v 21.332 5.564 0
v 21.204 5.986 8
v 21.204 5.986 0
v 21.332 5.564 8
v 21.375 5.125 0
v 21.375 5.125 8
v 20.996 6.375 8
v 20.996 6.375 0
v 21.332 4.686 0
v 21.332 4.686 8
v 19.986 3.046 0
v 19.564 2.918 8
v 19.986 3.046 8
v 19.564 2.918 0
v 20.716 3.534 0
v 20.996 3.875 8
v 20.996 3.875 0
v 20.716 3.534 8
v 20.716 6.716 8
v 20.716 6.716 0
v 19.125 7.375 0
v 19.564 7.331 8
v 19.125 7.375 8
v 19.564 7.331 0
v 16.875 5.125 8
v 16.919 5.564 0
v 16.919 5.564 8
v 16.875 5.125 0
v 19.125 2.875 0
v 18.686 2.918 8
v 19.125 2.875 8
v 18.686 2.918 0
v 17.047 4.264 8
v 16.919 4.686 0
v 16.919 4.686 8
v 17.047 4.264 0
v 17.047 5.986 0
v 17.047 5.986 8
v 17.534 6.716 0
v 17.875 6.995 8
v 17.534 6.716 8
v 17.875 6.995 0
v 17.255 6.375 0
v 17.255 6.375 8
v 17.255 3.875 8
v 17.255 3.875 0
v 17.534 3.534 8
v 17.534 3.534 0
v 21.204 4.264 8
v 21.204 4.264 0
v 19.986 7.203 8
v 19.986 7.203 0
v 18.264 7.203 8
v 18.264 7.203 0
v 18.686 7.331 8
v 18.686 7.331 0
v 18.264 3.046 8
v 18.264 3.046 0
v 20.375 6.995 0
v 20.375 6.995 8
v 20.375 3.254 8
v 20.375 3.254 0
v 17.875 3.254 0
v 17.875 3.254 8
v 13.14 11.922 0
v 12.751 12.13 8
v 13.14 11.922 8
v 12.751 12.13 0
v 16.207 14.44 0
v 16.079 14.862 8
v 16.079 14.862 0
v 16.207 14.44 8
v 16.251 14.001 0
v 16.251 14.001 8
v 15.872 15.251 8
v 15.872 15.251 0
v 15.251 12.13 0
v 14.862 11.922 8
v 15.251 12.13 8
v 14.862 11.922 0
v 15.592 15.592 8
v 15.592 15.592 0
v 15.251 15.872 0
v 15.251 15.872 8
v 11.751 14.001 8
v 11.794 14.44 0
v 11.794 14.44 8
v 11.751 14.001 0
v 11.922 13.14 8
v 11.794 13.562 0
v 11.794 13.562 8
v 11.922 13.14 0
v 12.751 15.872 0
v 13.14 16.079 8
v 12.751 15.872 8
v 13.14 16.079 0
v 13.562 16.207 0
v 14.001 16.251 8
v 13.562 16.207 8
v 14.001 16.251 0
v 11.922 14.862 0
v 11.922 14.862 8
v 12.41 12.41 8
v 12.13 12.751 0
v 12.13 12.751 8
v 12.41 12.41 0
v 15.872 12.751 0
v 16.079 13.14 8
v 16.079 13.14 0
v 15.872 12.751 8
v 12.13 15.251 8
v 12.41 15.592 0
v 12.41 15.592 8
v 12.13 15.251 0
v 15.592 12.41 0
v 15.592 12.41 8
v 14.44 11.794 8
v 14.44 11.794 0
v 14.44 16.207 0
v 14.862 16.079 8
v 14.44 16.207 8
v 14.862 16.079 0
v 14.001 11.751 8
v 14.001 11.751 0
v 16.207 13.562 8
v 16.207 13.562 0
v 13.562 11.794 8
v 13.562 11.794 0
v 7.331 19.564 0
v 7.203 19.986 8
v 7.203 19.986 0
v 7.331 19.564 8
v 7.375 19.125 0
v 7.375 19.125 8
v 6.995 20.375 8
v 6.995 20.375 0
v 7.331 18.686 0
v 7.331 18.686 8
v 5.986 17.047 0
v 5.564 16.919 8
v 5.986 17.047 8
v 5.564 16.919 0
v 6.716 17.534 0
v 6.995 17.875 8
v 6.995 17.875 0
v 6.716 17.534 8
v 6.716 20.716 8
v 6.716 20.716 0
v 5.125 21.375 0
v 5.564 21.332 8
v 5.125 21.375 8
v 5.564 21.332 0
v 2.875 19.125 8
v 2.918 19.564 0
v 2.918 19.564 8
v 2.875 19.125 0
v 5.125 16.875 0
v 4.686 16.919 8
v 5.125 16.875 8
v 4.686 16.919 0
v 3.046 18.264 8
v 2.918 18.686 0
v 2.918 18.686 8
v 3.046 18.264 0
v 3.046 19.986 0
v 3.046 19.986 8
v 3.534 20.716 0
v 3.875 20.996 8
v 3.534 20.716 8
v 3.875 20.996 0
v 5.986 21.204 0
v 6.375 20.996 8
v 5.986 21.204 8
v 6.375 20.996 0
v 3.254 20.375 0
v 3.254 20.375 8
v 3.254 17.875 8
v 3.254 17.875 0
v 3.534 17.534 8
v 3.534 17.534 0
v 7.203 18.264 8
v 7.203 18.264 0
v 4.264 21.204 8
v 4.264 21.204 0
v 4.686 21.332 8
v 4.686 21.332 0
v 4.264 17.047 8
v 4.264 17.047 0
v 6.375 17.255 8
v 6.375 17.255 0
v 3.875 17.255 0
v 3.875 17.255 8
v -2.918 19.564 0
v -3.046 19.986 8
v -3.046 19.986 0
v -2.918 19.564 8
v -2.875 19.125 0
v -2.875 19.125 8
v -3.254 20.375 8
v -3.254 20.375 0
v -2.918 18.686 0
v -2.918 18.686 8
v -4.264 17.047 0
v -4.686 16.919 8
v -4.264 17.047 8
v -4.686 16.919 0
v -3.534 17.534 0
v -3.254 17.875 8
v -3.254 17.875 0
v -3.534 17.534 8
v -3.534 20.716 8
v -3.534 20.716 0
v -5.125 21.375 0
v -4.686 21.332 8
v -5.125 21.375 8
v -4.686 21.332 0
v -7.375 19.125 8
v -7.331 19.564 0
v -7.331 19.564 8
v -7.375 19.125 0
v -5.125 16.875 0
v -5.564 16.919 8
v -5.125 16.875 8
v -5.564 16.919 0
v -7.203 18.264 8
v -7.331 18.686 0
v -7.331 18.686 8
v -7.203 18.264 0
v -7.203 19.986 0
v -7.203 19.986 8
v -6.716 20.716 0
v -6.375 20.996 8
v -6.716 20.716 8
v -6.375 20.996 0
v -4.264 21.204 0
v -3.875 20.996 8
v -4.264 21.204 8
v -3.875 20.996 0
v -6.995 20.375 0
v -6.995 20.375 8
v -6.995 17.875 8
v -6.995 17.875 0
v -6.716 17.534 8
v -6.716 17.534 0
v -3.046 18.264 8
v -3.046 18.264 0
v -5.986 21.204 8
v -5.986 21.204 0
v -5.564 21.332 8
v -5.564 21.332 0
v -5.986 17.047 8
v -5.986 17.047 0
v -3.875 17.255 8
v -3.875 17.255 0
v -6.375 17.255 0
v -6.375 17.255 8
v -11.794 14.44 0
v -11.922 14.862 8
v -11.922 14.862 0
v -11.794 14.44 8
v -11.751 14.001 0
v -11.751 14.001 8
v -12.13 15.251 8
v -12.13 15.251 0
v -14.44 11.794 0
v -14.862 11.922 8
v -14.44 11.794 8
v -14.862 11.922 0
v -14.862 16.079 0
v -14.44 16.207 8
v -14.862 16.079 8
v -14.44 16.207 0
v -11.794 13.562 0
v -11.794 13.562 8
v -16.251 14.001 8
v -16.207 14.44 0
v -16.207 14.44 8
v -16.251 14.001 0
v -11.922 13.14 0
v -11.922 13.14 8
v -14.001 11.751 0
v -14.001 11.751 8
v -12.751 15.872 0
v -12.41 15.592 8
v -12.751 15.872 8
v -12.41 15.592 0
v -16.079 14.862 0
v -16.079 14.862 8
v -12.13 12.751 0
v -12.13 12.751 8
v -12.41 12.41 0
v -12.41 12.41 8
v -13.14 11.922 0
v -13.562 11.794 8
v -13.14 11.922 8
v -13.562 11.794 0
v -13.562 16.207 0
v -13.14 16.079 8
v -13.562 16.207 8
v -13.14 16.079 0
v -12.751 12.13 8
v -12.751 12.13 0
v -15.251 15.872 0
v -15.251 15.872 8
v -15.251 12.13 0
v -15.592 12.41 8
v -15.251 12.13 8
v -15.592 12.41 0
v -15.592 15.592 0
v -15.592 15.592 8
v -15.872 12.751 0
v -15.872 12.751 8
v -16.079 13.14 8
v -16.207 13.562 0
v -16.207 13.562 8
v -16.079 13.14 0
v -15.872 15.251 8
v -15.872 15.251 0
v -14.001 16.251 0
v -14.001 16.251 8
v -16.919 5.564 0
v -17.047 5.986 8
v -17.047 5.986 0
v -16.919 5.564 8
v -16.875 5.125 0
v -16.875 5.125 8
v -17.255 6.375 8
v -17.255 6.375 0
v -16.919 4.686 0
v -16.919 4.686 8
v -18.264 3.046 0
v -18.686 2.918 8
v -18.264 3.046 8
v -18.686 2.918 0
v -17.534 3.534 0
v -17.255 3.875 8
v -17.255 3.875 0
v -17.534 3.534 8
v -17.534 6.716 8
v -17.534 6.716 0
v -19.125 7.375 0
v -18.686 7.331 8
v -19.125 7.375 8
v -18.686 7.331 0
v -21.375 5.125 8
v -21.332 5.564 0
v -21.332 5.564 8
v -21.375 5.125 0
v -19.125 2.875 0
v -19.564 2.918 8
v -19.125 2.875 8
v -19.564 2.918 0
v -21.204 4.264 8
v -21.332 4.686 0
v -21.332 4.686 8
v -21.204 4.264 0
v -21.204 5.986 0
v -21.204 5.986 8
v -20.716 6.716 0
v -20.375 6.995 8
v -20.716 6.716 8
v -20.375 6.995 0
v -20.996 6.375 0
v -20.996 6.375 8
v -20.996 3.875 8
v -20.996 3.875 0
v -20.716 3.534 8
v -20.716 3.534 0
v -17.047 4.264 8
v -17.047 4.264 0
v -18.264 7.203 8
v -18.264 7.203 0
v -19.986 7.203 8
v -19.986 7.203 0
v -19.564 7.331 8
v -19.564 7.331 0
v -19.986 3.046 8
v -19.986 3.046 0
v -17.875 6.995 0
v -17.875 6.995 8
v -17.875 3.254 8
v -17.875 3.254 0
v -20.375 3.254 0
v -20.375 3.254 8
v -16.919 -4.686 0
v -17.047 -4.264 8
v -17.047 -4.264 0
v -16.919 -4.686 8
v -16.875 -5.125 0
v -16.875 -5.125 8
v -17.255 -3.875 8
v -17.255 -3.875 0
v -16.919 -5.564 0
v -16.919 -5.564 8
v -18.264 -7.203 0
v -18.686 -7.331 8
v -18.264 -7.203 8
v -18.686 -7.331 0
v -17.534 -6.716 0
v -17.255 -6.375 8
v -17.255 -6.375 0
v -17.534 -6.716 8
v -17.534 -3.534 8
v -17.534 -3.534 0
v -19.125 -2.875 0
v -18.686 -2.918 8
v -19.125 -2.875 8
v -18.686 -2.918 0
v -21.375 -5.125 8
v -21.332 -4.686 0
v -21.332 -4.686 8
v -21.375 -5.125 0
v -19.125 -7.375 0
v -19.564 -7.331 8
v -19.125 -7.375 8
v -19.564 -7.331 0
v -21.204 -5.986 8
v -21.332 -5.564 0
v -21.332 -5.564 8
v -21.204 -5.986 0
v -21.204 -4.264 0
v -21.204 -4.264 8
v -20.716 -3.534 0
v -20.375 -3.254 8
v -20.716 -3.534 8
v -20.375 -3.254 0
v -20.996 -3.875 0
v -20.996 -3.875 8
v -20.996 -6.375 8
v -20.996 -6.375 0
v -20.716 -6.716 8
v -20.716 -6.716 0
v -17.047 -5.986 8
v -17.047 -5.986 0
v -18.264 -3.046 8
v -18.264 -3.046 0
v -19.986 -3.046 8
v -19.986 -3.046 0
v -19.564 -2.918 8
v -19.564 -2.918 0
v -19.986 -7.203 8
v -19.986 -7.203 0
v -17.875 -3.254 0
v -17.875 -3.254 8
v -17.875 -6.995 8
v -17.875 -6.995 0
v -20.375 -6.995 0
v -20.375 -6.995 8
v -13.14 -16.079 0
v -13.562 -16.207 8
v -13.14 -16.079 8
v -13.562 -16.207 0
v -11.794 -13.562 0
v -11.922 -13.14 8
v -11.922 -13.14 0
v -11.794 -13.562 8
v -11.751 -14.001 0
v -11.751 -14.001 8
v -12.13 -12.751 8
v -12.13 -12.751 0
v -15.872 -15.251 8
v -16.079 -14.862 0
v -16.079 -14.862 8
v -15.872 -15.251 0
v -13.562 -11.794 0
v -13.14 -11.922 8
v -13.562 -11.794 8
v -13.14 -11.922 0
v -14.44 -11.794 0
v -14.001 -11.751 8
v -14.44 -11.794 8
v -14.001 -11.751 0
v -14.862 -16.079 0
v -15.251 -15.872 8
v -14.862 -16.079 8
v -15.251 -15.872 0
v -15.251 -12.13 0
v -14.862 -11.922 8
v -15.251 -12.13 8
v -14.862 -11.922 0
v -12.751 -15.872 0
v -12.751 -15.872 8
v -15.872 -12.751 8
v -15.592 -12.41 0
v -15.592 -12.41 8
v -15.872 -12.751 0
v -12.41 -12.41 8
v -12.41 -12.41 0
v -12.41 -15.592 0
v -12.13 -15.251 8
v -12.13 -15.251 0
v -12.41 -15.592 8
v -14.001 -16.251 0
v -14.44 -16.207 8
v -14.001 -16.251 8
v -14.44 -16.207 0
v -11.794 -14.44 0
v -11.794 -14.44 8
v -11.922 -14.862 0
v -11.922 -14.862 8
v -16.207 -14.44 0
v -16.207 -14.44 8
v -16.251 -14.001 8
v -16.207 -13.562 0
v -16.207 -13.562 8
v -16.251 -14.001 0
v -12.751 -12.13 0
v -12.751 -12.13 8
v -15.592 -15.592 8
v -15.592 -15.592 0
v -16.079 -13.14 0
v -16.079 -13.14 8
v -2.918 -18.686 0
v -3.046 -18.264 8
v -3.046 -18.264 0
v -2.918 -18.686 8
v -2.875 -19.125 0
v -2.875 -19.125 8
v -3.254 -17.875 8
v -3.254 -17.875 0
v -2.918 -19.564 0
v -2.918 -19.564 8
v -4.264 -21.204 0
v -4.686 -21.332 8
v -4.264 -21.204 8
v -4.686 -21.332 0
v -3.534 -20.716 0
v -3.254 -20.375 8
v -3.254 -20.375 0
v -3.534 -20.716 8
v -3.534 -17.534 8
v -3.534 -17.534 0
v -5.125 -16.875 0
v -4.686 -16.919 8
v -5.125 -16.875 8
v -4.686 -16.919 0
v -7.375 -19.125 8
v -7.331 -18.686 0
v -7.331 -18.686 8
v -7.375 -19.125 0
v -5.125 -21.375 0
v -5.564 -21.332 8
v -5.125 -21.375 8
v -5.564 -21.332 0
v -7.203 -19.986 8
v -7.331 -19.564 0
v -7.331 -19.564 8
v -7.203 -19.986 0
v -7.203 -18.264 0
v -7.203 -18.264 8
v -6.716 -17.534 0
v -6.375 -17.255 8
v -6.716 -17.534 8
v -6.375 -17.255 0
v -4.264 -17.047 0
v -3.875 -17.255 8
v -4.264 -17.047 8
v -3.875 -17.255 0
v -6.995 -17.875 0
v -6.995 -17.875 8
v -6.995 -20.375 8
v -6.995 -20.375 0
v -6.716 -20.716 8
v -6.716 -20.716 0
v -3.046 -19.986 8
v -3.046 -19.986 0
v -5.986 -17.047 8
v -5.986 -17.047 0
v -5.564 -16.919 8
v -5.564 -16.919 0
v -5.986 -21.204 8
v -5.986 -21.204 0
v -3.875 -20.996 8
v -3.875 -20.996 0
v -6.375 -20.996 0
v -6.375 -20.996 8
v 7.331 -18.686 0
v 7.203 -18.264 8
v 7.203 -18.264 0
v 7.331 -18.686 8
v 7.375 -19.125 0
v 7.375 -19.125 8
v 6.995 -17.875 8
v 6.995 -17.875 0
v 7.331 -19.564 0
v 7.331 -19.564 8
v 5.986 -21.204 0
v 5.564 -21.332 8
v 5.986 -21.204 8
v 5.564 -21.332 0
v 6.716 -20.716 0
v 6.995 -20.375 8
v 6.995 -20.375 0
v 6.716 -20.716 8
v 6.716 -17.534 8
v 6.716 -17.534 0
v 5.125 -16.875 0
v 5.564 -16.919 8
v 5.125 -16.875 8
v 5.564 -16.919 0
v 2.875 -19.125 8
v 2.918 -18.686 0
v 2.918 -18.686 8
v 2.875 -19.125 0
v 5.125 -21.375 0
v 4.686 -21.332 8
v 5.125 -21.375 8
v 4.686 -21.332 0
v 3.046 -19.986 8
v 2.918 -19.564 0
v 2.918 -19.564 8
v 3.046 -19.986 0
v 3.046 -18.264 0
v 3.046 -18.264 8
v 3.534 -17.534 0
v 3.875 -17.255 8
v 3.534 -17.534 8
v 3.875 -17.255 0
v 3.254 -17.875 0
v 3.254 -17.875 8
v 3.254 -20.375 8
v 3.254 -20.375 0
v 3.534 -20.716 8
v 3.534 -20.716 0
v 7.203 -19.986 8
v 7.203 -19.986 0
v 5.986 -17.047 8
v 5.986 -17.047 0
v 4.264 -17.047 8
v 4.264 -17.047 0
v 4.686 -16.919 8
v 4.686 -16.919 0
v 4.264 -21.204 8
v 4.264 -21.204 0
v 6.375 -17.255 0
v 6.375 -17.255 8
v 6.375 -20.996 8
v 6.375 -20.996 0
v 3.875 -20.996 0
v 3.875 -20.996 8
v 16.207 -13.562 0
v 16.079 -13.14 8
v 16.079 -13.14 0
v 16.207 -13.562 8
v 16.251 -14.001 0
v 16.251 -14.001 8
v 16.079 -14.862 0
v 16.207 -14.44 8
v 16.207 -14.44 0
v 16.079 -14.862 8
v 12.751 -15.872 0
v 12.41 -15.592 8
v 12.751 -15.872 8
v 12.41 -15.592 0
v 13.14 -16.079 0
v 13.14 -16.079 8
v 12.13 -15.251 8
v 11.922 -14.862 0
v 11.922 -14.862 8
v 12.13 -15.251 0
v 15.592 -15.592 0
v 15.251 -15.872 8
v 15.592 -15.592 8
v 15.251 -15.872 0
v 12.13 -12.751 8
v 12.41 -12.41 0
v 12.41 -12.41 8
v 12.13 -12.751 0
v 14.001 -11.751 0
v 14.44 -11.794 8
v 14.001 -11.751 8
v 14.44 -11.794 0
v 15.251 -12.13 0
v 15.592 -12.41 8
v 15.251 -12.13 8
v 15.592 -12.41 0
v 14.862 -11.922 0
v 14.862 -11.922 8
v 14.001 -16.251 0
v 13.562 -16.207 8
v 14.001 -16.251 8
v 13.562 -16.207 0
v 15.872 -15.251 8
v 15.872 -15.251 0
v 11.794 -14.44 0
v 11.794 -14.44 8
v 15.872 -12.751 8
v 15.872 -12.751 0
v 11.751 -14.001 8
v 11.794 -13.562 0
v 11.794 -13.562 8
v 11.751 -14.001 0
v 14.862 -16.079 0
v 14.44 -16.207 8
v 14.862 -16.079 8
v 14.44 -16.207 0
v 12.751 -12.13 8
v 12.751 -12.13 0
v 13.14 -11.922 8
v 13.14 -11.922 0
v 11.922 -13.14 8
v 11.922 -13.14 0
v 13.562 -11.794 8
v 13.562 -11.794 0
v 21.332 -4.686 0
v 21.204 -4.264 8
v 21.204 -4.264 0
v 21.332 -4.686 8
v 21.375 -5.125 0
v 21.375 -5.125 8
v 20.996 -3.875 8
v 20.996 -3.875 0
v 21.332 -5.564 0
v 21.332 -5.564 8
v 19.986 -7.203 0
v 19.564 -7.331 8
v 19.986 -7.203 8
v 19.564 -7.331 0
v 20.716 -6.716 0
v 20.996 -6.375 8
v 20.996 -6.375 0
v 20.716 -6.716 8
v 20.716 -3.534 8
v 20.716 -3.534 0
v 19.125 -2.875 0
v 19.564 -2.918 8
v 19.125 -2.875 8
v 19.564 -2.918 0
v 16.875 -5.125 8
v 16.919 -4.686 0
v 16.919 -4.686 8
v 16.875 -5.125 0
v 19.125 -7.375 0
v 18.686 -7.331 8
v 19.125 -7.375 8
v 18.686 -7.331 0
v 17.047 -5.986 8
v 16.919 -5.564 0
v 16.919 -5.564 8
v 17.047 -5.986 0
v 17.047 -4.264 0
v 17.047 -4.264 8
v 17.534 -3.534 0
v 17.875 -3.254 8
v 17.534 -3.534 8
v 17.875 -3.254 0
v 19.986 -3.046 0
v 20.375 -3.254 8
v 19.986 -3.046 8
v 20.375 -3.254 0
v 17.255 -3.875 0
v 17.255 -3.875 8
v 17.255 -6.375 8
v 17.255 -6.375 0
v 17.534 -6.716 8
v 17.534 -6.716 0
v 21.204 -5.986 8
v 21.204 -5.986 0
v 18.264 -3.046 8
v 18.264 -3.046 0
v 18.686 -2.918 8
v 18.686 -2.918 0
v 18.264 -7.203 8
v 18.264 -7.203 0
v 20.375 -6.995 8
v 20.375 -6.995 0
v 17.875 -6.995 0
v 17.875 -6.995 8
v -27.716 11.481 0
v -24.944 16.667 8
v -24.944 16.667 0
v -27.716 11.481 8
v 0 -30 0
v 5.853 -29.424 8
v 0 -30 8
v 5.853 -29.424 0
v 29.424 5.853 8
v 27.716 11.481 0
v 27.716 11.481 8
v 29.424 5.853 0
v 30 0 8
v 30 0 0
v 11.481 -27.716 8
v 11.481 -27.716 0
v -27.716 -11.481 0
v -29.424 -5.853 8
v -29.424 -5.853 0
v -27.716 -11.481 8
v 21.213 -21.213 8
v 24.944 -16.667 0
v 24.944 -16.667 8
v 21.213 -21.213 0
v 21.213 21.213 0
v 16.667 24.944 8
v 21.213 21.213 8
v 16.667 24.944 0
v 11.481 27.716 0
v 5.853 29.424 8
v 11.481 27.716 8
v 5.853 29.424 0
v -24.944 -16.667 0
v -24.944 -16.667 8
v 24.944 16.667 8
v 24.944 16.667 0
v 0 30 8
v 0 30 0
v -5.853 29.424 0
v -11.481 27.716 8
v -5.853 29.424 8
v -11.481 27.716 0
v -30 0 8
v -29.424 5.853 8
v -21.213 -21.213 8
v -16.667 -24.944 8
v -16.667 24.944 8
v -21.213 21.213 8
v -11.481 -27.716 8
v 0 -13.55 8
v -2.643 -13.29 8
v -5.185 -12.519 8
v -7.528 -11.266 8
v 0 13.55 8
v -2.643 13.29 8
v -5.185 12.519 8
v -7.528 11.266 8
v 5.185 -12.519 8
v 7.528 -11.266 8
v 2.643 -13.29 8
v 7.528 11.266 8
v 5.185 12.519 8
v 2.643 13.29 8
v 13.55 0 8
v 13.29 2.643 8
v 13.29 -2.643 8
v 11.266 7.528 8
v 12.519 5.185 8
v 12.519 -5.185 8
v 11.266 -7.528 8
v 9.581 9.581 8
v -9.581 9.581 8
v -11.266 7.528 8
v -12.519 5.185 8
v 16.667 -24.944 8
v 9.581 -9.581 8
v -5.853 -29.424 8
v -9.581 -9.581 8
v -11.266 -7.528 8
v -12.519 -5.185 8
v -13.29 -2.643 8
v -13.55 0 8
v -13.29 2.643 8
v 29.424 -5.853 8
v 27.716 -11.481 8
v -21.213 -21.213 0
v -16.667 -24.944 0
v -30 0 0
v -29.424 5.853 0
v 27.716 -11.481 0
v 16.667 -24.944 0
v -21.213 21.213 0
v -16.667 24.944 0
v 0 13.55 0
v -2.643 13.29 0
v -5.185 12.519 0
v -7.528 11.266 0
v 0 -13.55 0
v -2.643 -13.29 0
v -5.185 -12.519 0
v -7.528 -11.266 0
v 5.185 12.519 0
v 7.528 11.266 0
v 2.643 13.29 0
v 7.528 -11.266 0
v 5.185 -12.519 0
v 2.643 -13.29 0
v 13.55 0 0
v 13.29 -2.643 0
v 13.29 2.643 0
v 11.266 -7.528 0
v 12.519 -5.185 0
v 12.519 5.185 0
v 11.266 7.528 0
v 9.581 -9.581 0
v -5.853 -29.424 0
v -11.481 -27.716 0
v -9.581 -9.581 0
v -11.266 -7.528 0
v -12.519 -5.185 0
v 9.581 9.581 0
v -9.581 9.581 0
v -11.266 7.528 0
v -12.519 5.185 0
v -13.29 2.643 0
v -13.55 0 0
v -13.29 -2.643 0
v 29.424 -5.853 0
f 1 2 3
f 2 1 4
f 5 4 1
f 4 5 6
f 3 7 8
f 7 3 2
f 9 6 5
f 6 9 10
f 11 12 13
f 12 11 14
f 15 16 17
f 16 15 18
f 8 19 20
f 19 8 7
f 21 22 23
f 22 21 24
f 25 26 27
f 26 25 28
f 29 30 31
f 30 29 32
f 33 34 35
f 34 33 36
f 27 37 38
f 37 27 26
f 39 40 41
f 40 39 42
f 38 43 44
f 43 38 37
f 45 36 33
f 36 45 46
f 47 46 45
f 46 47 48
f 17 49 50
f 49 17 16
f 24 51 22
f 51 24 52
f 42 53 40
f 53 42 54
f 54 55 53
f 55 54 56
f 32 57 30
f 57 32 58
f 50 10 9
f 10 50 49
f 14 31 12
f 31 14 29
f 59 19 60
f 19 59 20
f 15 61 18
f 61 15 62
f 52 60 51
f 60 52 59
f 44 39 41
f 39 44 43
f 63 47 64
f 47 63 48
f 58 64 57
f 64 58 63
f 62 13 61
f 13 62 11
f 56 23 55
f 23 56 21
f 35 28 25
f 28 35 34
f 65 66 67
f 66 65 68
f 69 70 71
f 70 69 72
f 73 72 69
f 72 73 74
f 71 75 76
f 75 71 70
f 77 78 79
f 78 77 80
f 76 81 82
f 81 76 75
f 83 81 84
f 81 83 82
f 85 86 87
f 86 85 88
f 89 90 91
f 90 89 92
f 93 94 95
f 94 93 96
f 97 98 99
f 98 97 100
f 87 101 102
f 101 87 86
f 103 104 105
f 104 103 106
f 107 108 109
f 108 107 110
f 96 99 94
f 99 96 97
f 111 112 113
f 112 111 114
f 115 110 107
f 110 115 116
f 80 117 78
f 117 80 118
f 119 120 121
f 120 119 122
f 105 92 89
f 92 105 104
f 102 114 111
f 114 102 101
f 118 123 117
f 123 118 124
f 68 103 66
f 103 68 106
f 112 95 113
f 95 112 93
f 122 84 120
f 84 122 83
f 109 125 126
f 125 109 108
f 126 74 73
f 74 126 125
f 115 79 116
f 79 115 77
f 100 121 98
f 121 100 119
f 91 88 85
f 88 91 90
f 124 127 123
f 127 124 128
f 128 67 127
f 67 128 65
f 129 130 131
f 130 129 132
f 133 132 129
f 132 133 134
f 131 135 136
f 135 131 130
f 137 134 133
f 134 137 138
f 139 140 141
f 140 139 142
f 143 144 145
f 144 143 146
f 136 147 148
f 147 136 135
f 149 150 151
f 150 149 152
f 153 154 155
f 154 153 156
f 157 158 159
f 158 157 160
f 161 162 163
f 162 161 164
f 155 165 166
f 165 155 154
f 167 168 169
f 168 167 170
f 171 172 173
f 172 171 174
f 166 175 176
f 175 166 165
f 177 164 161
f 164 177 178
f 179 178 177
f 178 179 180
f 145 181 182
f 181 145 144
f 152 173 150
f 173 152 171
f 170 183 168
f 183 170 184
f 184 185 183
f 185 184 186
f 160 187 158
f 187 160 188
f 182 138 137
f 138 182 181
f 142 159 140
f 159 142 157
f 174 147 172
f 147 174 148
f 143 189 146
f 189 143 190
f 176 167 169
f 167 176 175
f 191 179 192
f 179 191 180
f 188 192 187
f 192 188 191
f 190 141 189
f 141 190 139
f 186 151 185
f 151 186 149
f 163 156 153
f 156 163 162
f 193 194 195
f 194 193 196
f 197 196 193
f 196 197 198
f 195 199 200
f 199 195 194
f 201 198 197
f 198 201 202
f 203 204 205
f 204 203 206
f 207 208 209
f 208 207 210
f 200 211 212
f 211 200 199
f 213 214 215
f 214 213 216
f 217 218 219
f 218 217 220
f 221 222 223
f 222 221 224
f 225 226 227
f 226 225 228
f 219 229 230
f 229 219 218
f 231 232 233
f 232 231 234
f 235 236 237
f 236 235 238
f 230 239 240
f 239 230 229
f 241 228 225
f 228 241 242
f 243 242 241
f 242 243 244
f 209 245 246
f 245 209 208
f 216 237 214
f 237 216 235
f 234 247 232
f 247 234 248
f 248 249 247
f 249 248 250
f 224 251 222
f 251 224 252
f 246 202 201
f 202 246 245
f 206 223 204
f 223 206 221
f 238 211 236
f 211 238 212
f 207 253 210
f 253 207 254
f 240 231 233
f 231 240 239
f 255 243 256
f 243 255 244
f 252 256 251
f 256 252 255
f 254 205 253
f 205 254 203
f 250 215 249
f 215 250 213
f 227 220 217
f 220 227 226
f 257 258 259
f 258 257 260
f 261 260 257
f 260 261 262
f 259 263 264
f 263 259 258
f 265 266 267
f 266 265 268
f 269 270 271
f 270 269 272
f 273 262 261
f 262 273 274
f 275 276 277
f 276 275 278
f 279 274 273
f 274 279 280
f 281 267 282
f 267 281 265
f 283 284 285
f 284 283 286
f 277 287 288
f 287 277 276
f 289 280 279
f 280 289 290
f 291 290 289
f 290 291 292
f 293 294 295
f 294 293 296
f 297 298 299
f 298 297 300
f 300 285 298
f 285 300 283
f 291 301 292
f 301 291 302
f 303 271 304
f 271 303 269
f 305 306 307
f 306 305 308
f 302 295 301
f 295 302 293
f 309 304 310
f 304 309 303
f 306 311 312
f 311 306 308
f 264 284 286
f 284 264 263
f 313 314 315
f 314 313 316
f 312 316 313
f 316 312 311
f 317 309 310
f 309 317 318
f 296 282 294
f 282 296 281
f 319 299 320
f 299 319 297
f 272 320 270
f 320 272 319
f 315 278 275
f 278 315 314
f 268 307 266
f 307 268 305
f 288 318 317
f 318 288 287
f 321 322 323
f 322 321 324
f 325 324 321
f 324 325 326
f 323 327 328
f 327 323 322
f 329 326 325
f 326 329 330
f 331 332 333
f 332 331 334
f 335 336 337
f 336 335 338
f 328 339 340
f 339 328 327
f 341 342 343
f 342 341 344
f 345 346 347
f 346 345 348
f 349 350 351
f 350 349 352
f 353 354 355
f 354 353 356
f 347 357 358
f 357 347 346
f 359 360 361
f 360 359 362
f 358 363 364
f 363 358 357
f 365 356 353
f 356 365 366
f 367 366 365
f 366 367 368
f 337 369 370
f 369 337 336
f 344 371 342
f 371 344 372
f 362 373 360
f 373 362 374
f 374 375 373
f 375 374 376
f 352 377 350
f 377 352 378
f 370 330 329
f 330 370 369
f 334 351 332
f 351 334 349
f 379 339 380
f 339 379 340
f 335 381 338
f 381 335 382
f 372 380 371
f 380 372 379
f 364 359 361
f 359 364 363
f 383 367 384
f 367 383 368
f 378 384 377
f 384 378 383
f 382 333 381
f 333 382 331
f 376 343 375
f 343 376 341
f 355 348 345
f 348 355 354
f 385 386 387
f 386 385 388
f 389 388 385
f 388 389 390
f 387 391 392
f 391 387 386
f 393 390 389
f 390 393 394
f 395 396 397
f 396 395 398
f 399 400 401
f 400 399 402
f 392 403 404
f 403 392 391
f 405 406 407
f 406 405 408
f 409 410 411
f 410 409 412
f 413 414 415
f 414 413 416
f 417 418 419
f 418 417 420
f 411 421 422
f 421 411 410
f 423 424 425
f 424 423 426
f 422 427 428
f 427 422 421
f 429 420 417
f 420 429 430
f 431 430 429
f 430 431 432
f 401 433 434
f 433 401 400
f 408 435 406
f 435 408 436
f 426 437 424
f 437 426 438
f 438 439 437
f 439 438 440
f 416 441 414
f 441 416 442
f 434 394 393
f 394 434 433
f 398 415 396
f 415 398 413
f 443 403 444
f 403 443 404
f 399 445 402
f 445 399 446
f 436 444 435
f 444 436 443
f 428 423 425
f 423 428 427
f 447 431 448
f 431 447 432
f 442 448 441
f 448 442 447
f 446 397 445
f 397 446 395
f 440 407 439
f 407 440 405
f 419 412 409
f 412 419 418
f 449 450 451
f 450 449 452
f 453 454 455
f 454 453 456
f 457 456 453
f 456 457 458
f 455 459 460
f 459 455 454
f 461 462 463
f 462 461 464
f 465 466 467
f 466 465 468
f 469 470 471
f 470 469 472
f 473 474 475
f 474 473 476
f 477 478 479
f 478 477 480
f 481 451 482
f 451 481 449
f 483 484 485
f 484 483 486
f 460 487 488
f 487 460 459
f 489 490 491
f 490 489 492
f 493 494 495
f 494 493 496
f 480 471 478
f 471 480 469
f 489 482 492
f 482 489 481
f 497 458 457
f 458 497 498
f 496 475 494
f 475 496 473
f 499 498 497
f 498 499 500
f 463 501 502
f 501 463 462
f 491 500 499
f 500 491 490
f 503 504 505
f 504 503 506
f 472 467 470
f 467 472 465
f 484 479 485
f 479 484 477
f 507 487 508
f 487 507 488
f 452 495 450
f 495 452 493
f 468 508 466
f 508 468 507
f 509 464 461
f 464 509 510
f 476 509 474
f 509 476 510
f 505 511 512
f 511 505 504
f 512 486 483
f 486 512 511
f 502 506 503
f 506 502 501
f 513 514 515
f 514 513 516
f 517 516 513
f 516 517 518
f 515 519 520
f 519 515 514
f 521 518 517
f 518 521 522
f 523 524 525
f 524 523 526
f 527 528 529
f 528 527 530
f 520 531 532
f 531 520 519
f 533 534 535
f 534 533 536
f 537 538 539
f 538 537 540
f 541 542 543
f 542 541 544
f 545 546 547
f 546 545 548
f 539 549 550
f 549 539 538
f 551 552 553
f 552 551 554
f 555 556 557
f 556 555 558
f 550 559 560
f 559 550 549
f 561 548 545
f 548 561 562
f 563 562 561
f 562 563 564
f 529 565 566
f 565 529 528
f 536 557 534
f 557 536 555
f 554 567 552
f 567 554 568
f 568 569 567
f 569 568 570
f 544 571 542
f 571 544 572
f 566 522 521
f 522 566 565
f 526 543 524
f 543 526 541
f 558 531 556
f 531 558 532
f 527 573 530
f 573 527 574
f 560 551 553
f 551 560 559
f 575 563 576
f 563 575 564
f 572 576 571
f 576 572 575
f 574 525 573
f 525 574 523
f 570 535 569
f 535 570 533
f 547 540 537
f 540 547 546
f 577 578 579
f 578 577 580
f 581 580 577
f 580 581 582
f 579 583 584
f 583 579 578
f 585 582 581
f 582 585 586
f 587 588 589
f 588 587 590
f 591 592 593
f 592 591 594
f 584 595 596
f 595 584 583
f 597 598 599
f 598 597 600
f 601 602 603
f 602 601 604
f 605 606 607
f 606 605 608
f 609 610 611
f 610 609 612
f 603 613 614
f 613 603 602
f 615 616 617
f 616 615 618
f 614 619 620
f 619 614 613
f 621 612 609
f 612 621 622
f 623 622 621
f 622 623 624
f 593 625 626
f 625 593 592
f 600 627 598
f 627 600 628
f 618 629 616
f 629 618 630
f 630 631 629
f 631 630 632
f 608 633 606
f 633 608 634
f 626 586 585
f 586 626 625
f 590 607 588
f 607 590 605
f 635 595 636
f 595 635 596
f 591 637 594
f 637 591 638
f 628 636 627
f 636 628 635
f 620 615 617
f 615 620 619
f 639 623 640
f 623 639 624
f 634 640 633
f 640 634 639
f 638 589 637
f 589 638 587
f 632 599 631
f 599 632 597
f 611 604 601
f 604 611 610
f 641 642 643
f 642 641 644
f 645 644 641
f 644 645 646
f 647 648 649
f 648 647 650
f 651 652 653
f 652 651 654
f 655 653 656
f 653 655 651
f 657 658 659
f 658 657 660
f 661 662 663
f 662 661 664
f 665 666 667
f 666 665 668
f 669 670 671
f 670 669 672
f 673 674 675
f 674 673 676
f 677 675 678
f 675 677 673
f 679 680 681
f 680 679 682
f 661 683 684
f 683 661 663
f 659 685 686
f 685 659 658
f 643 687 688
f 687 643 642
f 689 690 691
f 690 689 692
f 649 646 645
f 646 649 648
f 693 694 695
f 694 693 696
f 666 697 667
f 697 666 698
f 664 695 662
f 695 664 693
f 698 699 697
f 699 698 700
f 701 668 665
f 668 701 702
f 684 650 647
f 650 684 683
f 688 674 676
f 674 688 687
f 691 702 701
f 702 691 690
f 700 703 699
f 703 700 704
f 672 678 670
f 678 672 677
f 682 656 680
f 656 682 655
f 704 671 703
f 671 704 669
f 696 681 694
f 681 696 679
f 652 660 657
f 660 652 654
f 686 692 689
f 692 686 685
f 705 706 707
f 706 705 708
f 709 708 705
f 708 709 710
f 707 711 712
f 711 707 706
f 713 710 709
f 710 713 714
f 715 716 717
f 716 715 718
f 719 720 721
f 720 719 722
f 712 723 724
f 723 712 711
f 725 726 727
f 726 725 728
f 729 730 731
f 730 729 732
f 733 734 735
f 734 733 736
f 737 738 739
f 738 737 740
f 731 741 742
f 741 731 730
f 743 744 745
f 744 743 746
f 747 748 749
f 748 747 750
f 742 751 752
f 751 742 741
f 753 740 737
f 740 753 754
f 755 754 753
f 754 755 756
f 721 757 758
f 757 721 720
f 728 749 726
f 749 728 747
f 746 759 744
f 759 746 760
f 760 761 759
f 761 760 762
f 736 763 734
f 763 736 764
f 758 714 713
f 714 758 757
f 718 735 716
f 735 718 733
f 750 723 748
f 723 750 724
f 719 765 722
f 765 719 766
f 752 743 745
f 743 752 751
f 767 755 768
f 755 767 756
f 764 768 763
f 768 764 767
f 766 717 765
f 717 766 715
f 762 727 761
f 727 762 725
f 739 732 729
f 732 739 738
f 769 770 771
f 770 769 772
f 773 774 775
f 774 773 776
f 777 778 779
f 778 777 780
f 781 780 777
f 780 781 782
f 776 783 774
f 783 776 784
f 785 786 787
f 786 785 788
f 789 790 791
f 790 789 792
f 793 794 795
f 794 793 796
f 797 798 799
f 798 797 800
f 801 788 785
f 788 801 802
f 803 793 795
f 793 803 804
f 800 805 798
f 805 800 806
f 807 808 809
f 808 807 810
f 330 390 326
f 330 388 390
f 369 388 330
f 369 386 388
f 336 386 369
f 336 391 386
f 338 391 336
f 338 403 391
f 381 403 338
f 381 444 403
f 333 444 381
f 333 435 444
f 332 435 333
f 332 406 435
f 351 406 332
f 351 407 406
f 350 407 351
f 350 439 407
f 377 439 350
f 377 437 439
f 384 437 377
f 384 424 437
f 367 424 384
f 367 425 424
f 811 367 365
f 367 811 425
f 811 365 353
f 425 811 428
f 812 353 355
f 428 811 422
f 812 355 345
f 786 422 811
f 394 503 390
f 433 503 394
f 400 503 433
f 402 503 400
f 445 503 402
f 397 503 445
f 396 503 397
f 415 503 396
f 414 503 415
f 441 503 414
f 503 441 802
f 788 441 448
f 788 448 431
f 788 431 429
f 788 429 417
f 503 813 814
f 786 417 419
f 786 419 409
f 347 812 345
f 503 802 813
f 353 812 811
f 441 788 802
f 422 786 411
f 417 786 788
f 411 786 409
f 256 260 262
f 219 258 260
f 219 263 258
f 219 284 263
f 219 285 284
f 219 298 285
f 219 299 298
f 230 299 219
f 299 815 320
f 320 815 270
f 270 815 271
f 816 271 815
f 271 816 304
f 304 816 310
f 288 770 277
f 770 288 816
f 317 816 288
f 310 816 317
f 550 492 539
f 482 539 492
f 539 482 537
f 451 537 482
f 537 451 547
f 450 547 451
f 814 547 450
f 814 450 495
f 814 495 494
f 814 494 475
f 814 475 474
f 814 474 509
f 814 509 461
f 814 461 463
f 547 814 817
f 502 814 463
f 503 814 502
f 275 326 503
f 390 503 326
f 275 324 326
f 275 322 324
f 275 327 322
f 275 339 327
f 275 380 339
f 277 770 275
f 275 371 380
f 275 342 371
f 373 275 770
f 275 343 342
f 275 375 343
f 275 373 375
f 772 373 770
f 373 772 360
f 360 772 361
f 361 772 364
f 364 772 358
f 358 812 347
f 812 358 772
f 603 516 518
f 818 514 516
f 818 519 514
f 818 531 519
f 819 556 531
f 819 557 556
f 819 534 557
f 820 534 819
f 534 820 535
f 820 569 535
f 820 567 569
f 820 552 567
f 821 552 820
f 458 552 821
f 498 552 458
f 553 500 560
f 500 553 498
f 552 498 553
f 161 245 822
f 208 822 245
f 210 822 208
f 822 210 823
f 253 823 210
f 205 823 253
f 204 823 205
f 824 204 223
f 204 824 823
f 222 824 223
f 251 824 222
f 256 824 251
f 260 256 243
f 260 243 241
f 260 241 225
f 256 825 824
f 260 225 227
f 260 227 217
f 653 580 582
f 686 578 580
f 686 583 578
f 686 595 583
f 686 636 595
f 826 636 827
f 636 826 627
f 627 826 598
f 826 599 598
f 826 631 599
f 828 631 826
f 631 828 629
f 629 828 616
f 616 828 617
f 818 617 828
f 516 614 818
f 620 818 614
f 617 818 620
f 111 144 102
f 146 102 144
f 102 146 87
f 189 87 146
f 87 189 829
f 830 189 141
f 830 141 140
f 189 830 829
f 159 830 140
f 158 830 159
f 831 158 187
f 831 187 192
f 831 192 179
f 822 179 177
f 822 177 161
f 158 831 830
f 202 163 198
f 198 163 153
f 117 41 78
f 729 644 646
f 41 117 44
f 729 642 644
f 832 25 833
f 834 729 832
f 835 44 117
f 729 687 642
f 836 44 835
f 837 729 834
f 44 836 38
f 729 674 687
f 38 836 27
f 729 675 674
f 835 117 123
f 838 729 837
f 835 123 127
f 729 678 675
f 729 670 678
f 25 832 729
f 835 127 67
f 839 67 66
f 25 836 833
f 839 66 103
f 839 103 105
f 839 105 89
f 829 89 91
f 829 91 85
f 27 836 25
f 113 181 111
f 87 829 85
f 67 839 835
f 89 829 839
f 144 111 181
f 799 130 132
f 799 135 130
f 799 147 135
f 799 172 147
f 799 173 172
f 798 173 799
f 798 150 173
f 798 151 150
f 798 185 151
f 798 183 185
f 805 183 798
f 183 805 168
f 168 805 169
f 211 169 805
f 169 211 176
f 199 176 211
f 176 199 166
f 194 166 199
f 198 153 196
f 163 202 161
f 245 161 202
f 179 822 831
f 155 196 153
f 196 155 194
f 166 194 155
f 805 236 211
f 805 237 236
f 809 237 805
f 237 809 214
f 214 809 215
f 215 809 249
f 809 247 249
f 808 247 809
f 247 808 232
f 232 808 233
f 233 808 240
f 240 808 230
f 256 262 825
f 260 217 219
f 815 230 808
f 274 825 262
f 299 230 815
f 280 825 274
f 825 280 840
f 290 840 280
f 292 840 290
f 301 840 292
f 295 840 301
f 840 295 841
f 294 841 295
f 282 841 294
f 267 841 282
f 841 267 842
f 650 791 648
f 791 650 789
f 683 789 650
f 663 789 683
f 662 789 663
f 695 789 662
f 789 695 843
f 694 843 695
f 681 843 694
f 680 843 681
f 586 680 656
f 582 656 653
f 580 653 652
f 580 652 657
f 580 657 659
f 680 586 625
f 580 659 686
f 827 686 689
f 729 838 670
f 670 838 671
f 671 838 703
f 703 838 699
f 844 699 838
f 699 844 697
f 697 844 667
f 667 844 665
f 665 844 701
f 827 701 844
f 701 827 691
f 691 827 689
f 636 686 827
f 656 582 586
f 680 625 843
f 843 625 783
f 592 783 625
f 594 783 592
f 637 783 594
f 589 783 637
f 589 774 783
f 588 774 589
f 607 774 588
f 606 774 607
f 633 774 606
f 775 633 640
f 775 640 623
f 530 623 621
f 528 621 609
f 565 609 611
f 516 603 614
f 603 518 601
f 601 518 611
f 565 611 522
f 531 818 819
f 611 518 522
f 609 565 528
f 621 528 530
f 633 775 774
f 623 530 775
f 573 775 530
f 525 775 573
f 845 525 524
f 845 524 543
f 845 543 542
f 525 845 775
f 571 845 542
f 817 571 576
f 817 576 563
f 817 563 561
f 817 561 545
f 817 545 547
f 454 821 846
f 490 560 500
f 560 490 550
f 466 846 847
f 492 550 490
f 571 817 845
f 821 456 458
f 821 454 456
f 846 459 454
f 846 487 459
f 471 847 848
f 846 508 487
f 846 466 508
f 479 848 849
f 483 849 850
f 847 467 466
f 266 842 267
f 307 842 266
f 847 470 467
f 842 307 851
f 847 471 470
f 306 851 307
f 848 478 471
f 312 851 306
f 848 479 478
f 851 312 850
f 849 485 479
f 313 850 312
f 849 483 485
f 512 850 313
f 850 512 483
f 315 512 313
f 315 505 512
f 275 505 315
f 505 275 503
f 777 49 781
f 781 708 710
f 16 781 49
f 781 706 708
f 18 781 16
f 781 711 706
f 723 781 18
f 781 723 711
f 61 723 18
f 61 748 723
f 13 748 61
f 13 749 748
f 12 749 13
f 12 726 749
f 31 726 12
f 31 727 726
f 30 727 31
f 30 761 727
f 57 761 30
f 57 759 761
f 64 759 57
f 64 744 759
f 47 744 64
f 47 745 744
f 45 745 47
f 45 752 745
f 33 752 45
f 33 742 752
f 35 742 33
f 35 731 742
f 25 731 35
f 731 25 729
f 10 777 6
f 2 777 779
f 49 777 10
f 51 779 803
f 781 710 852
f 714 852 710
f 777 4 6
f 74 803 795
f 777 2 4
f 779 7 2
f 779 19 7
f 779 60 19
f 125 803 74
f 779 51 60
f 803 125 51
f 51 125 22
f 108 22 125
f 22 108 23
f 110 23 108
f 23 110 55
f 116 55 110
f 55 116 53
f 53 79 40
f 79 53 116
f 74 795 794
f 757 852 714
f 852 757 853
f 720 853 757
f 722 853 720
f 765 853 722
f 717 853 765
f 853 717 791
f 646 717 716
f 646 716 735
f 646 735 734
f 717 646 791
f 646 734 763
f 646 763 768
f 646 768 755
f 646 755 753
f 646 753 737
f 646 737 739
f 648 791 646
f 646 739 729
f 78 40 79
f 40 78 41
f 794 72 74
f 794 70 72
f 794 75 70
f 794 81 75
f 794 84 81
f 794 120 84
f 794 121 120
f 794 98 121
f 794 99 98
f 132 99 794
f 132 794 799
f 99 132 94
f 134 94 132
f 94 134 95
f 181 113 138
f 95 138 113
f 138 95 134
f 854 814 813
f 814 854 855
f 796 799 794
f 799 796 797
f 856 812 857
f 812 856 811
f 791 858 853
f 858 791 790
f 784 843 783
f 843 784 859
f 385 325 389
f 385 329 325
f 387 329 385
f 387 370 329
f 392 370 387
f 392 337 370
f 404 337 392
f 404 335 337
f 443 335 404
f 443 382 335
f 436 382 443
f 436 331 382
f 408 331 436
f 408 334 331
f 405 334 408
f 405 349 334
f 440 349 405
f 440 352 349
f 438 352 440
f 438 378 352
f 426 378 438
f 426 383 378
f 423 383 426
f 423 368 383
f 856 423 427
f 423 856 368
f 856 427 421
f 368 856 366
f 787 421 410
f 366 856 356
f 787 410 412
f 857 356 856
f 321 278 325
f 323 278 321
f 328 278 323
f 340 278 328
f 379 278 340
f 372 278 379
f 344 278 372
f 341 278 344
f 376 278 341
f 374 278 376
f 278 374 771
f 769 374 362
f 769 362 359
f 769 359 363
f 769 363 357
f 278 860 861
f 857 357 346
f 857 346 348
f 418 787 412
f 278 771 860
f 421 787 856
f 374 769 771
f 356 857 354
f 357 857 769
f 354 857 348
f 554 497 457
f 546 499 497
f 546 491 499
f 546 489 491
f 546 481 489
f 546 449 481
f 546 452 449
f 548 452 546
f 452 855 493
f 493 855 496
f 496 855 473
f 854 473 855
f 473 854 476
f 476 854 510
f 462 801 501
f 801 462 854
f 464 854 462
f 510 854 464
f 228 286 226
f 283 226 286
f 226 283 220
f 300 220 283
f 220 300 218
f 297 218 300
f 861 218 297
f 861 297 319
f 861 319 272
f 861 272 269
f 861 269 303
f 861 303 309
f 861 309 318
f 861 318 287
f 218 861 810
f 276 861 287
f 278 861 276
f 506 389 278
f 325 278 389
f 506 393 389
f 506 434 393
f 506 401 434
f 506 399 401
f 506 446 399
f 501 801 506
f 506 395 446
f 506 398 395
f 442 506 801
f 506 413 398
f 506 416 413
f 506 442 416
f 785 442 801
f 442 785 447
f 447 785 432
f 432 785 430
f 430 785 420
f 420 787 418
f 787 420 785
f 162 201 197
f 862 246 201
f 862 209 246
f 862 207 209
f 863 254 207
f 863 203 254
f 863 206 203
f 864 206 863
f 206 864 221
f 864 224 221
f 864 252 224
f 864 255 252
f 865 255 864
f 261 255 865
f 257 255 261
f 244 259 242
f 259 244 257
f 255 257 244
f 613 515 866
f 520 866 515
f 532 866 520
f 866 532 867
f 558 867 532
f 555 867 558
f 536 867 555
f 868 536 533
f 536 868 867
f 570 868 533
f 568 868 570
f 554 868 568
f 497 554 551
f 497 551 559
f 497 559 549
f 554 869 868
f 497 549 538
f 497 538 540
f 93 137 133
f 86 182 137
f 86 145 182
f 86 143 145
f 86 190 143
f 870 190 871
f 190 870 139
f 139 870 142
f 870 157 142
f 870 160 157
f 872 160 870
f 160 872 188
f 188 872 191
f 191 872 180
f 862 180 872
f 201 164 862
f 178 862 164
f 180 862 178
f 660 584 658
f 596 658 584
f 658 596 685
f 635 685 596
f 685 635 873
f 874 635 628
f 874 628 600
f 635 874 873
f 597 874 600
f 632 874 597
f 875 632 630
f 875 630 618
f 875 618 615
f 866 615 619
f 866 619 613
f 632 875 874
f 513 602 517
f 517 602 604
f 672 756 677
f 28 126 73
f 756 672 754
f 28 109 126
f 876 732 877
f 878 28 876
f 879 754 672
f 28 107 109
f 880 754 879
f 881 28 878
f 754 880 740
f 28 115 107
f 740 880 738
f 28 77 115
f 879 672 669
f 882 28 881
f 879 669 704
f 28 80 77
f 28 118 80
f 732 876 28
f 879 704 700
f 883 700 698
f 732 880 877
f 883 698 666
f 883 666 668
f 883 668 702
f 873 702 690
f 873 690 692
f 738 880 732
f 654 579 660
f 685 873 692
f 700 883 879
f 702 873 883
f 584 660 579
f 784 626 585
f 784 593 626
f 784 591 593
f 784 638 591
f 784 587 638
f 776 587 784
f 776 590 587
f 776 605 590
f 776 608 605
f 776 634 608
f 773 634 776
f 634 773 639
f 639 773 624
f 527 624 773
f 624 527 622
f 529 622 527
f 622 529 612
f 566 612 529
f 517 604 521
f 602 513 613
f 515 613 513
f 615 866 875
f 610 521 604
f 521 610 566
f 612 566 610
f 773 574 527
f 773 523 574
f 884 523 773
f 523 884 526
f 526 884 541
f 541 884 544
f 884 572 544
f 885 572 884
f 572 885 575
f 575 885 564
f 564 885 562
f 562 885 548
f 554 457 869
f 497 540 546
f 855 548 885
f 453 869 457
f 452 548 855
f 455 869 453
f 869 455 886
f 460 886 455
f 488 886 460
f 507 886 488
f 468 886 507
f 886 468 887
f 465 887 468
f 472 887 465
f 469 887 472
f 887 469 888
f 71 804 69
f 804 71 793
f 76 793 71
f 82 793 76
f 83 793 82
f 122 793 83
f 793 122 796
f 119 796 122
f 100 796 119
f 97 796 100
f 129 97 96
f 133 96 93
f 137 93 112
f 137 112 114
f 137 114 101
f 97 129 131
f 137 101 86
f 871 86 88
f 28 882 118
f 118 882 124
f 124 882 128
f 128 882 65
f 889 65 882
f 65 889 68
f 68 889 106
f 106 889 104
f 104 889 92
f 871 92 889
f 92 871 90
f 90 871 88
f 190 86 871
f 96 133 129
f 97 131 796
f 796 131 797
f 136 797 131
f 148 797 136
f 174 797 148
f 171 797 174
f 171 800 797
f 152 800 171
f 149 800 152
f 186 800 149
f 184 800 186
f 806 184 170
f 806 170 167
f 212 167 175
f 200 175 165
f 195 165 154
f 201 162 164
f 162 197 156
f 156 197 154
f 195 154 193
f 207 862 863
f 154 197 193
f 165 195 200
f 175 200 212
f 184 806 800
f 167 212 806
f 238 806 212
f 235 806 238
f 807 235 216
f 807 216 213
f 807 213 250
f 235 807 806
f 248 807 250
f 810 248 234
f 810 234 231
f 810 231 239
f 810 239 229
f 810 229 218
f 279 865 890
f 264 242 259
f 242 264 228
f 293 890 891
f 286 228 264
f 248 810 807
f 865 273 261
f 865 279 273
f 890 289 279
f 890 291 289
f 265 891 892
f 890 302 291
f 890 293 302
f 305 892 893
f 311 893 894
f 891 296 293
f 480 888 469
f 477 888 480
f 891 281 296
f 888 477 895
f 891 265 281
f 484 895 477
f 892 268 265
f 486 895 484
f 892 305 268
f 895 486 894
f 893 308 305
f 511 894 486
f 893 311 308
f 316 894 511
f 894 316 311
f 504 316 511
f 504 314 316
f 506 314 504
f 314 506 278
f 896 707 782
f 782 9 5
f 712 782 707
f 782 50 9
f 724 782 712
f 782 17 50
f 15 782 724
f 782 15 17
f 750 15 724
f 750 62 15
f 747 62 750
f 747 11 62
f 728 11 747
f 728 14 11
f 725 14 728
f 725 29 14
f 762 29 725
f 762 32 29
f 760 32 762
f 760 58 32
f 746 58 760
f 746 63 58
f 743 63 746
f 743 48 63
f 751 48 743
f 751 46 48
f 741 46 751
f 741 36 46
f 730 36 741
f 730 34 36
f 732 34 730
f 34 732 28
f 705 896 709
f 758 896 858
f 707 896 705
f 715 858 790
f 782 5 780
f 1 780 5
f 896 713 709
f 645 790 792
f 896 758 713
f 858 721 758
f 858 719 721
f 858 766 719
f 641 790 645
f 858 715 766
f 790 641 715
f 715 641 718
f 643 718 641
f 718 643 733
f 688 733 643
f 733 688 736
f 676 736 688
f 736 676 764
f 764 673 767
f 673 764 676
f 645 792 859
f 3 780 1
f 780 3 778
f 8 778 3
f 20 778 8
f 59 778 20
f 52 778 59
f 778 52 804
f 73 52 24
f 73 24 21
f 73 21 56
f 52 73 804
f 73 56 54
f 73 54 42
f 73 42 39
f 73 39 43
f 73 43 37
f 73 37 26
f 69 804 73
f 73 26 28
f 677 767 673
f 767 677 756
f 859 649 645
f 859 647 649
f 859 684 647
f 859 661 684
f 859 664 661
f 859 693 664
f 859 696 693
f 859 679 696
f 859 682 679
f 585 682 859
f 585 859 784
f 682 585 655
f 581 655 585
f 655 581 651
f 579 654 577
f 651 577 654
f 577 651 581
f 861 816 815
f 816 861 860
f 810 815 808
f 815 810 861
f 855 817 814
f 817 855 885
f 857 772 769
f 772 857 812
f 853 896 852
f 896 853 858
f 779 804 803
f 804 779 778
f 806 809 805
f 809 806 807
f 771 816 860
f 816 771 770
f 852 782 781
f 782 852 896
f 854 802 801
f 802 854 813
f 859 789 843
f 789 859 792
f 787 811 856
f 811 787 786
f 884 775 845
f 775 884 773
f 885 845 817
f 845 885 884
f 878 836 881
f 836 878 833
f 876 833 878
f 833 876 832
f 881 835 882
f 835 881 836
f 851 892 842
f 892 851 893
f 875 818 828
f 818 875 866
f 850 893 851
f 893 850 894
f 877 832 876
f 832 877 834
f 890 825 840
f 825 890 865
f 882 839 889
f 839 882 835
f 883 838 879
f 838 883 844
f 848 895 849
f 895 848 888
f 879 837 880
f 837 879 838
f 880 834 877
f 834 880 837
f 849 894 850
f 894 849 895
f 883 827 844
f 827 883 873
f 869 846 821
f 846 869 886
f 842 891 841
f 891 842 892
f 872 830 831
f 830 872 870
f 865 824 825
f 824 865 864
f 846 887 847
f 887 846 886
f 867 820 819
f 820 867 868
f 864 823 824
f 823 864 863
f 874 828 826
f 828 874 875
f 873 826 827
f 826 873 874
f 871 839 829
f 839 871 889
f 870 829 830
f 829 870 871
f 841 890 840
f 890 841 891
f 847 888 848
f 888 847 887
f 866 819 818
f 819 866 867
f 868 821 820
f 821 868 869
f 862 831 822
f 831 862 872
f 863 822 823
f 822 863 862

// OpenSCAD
$fn = 32;

// ----------------------------------------------------------------------
// Flange Ø60 x 8
// 12 holes on a Ø39.6 bolt circle, bolted joints
// ----------------------------------------------------------------------

// --- parameters (mm) ---
flange_d = 60;   // outside diameter of the flange
thickness = 8;   // flange thickness
holes = 12;      // number of bolt holes
pcd = 39.6;      // bolt circle diameter
start_deg = 15;  // angle of the first hole, from +X
hole_d = 4.5;    // bolt hole diameter
bore_d = 27.1;   // central through bore
hub_d = 37.1;    // hub outside diameter
hub_h = 0;       // hub height above the flange face (0 = no hub)

// --- derived feature positions (mm) ---
height = thickness + hub_h;  // = 8   overall height of the part
pcd_r = pcd / 2;             // = 19.8   bolt circle radius
hole_step = 360 / holes;     // = 30   angular pitch
feature_centers = [
  [pcd_r * cos(start_deg + 0 * hole_step), pcd_r * sin(start_deg + 0 * hole_step)],
  [pcd_r * cos(start_deg + 1 * hole_step), pcd_r * sin(start_deg + 1 * hole_step)],
  [pcd_r * cos(start_deg + 2 * hole_step), pcd_r * sin(start_deg + 2 * hole_step)],
  [pcd_r * cos(start_deg + 3 * hole_step), pcd_r * sin(start_deg + 3 * hole_step)],
  [pcd_r * cos(start_deg + 4 * hole_step), pcd_r * sin(start_deg + 4 * hole_step)],
  [pcd_r * cos(start_deg + 5 * hole_step), pcd_r * sin(start_deg + 5 * hole_step)],
  [pcd_r * cos(start_deg + 6 * hole_step), pcd_r * sin(start_deg + 6 * hole_step)],
  [pcd_r * cos(start_deg + 7 * hole_step), pcd_r * sin(start_deg + 7 * hole_step)],
  [pcd_r * cos(start_deg + 8 * hole_step), pcd_r * sin(start_deg + 8 * hole_step)],
  [pcd_r * cos(start_deg + 9 * hole_step), pcd_r * sin(start_deg + 9 * hole_step)],
  [pcd_r * cos(start_deg + 10 * hole_step), pcd_r * sin(start_deg + 10 * hole_step)],
  [pcd_r * cos(start_deg + 11 * hole_step), pcd_r * sin(start_deg + 11 * hole_step)]
];   // bolt hole centres on the pitch circle

// flange disc, every hole and the bore cut straight through
difference() {
  union() {
    cylinder(d = flange_d, h = thickness);
  }
  translate([0, 0, -1]) cylinder(d = bore_d, h = height + 2);  // bore, through
  for (centre = feature_centers)
    translate([centre[0], centre[1], -1]) cylinder(d = hole_d, h = thickness + 2);
}
